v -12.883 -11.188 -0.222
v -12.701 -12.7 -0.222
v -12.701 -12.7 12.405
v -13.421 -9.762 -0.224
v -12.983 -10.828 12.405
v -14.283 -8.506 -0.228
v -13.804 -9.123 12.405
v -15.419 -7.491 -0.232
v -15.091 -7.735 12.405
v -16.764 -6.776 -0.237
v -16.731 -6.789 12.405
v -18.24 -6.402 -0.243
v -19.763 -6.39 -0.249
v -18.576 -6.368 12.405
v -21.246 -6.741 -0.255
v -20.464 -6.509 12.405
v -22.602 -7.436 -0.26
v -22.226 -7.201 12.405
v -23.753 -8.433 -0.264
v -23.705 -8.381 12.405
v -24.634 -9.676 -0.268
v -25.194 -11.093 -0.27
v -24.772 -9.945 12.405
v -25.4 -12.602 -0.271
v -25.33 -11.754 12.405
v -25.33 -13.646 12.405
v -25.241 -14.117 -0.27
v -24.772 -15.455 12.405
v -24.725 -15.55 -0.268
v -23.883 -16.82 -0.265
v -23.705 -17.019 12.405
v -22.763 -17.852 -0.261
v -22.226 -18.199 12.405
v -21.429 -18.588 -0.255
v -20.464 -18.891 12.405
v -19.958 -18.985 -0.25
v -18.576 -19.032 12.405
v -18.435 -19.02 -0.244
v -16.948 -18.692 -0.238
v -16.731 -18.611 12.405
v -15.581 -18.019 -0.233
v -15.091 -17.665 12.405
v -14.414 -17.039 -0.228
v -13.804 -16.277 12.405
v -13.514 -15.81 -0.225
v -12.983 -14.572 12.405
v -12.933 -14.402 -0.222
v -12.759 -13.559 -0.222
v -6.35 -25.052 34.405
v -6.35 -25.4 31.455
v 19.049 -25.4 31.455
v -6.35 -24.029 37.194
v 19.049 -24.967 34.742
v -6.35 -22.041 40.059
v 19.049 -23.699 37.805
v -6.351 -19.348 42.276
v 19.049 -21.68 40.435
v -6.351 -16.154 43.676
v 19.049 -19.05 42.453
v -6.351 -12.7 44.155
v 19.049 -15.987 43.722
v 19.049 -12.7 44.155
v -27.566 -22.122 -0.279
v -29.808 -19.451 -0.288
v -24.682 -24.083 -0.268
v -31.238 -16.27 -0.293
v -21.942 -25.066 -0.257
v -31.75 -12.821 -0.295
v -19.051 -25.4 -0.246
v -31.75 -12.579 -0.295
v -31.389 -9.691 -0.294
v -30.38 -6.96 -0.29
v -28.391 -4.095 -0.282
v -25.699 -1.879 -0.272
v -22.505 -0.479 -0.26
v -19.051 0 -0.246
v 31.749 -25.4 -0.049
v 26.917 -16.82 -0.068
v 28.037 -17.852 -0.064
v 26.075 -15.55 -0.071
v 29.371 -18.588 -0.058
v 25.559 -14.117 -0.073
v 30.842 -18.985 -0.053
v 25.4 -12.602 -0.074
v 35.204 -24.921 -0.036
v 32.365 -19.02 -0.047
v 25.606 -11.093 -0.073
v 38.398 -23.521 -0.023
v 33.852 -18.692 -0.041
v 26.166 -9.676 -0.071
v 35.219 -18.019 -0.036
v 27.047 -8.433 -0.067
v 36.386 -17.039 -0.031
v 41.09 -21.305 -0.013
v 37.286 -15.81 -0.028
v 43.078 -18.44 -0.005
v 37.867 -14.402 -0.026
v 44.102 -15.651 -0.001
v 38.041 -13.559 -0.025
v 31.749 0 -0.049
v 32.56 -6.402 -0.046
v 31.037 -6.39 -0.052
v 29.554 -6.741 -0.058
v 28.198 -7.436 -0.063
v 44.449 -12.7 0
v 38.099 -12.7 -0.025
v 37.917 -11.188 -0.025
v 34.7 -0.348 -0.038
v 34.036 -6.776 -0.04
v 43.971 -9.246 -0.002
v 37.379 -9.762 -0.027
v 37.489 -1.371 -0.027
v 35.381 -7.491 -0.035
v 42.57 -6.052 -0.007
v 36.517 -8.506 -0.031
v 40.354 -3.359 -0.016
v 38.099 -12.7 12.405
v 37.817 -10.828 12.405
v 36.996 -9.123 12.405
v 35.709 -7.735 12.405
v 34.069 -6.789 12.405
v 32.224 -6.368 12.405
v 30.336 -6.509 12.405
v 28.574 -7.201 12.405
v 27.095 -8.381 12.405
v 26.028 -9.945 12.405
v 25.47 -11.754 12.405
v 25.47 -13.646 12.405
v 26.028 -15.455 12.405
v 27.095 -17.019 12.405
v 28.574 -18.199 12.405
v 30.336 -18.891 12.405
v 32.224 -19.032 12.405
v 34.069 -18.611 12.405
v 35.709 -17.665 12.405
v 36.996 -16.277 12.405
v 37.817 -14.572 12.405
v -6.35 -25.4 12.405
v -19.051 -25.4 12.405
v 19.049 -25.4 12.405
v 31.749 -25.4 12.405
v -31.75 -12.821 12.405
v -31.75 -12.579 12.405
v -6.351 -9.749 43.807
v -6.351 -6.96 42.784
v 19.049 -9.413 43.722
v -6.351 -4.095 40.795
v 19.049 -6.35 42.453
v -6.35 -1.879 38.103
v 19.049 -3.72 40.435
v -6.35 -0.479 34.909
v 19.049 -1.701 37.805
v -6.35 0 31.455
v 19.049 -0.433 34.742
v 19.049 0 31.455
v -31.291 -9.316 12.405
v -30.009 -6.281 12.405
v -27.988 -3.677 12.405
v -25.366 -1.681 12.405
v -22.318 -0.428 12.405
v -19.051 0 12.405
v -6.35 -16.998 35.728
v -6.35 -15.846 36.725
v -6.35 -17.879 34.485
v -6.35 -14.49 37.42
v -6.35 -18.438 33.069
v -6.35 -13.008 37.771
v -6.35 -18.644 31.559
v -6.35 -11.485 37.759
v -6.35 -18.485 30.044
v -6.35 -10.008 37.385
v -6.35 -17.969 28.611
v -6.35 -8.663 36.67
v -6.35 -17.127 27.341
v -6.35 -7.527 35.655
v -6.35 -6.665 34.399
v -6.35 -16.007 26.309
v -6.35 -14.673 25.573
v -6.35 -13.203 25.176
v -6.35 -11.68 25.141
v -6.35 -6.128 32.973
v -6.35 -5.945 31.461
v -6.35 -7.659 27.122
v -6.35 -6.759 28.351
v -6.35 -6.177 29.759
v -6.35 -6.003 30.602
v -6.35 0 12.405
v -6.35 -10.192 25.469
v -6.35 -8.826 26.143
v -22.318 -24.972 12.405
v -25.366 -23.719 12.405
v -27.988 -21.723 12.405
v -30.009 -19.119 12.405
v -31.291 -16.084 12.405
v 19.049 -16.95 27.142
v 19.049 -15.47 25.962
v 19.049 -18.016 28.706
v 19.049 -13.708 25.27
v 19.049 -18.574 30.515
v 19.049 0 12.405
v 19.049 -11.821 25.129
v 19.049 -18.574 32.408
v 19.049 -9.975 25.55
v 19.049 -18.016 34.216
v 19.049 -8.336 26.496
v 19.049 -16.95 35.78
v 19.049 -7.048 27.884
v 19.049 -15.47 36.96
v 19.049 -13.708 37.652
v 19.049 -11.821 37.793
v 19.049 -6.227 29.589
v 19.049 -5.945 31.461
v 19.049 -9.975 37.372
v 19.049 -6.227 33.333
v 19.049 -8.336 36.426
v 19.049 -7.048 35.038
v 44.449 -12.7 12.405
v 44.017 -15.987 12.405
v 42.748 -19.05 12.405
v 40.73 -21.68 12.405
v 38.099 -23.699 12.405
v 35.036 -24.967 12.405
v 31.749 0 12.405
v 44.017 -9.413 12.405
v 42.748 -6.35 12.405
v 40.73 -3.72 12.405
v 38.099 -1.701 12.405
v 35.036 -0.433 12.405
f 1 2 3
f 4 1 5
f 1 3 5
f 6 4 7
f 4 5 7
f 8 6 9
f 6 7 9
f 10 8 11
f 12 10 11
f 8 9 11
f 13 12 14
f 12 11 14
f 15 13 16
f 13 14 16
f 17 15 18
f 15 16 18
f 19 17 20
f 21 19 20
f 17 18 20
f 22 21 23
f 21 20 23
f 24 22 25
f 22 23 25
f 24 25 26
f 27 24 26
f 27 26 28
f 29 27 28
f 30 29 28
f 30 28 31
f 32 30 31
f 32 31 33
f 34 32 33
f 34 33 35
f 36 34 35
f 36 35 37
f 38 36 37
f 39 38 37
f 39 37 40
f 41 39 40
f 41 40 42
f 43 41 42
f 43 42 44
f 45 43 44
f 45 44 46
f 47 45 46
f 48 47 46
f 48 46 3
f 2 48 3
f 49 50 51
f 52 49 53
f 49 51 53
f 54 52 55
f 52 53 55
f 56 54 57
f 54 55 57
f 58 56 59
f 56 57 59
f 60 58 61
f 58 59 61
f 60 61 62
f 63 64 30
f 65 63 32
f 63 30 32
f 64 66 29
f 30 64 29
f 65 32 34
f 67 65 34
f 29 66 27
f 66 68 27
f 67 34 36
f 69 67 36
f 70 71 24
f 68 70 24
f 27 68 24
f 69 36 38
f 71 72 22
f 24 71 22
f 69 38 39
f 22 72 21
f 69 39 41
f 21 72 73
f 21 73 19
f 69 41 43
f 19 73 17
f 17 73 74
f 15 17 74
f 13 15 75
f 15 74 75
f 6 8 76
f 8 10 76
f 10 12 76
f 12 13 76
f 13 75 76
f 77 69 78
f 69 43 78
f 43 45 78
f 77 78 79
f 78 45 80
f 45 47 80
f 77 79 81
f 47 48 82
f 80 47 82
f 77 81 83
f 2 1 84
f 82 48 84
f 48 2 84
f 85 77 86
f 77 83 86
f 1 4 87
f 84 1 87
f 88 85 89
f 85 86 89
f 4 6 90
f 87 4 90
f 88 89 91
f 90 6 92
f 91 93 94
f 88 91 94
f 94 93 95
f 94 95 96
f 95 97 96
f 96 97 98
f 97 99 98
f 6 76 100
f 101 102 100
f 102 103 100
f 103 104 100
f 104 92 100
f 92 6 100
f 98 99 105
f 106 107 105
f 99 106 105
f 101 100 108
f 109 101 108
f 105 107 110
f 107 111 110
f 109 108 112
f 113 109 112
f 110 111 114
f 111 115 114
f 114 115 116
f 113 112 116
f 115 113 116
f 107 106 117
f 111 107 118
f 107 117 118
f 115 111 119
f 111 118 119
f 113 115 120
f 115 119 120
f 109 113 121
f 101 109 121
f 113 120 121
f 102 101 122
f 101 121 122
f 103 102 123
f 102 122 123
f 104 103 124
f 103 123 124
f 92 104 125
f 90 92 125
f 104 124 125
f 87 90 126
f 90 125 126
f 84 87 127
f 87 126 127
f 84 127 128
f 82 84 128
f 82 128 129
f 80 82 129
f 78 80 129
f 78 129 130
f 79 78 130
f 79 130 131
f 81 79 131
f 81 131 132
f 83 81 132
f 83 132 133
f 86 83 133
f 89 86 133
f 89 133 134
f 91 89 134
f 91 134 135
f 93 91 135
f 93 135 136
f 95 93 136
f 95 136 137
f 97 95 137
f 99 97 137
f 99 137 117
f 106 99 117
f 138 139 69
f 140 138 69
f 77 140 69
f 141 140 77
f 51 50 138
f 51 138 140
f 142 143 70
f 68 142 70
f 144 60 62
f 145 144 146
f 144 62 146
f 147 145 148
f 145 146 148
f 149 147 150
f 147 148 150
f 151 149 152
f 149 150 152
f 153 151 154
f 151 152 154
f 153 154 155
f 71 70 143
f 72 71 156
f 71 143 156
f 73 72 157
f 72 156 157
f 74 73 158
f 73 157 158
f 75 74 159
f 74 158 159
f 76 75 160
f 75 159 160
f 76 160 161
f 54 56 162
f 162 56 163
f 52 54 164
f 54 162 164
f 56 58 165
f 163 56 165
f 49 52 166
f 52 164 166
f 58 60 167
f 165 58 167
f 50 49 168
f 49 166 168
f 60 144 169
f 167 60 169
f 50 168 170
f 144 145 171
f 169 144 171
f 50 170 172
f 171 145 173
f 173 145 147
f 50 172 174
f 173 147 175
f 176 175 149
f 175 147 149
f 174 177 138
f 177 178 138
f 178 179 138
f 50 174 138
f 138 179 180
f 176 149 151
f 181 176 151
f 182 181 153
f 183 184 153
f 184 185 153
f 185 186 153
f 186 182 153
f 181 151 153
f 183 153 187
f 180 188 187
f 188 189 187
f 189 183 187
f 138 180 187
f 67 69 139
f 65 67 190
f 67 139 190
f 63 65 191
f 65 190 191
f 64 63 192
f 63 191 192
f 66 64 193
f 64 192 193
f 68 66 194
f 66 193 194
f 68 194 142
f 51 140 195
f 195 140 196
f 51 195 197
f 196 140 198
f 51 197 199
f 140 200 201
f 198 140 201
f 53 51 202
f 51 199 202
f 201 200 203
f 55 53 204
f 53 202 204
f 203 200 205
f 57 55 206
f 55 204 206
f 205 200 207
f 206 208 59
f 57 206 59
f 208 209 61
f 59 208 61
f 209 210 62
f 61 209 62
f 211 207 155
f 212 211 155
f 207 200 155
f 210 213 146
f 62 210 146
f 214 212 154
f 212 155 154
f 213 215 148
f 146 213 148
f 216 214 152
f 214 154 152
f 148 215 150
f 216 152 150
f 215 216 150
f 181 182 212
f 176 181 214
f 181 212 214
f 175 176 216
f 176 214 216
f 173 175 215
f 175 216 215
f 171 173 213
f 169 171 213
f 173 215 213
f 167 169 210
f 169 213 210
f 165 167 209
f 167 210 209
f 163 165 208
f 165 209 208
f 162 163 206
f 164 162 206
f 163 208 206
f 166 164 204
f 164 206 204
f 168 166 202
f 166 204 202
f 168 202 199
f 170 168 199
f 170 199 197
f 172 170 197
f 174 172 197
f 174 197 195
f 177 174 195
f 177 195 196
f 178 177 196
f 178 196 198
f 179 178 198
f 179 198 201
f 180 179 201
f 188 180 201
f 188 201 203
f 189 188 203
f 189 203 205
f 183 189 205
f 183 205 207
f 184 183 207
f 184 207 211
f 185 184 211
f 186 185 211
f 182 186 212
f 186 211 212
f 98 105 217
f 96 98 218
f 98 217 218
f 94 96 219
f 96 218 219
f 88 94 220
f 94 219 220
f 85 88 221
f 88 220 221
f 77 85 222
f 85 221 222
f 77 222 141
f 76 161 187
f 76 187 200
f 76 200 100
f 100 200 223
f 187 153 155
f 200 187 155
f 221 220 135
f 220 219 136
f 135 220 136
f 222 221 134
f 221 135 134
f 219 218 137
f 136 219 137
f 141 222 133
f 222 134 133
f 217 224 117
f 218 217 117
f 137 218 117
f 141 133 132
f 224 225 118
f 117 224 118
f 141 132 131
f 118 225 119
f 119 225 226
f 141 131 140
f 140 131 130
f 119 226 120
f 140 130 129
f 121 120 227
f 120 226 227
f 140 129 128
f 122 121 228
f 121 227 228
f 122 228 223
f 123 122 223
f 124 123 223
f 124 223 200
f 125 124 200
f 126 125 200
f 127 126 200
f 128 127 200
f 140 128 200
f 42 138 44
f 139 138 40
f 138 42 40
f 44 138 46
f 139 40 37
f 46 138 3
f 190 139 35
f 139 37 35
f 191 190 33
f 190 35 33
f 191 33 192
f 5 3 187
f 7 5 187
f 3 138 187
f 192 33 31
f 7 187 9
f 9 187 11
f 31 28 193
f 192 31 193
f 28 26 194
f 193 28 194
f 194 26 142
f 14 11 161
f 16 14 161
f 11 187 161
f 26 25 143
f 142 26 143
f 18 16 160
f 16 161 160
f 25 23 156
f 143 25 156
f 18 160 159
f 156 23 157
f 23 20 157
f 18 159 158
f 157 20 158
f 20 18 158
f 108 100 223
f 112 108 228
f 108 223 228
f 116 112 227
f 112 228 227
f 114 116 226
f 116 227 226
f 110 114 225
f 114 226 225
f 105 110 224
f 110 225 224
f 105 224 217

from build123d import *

# Parameters (mm, degrees)
F1_DEPTH = 25.4
F2_R     = 6.35
F3_DEPTH = 25.4
F4_R     = 6.35
F5_DEPTH = 25.4
F6_R     = 6.35
F7_DEPTH = 25.4


with BuildPart() as f1:
    # F0 (on Front) → F1 (new body)
    with BuildSketch(Plane.XZ):
        Polygon((-31.75, 12.404651), (-31.75, -0.295349), (44.449428, -2e-06), (44.449428, 12.404651), (19.049428, 12.404651), (19.049428, 44.154651), (-6.350572, 44.154651), (-6.35, 12.404651), align=None)
    extrude(amount=F1_DEPTH)

    # F2 (on face) → F3 (cut)
    with BuildSketch(Plane.XY.offset(12.404651)):
        with Locations((-19.050572, -12.7)):
            Circle(F2_R)
        with BuildLine():
            ThreePointArc((-31.75, -12.579426), (-27.988098, -3.677215), (-19.050572, 0))
            Line((-19.050572, 0), (-31.75, 0))
            Line((-31.75, 0), (-31.75, -12.579426))
        make_face()
        with BuildLine():
            ThreePointArc((-19.050572, -25.4), (-27.988098, -21.722785), (-31.75, -12.820574))
            Line((-31.75, -12.820574), (-31.75, -25.4))
            Line((-31.75, -25.4), (-19.050572, -25.4))
        make_face()
    extrude(amount=-F3_DEPTH, mode=Mode.SUBTRACT)

    # F4 (on face) → F5 (cut)
    with BuildSketch(Plane.XY.offset(12.404651)):
        with Locations((31.749428, -12.7)):
            Circle(F4_R)
        with BuildLine():
            ThreePointArc((31.749428, 0), (40.729684, -3.719744), (44.449428, -12.7))
            Line((44.449428, -12.7), (44.449428, 0))
            Line((44.449428, 0), (31.749428, 0))
        make_face()
        with BuildLine():
            ThreePointArc((44.449428, -12.7), (40.729684, -21.680256), (31.749428, -25.4))
            Line((31.749428, -25.4), (44.449428, -25.4))
            Line((44.449428, -25.4), (44.449428, -12.7))
        make_face()
    extrude(amount=-F5_DEPTH, mode=Mode.SUBTRACT)

    # F6 (on face) → F7 (cut)
    with BuildSketch(Plane.YZ.offset(19.049428)):
        with Locations((-12.295053, 31.461109)):
            Circle(F6_R)
        with BuildLine():
            ThreePointArc((-12.7, 44.154651), (-3.719744, 40.434907), (0, 31.454651))
            Line((0, 31.454651), (0, 44.154651))
            Line((0, 44.154651), (-12.7, 44.154651))
        make_face()
        with BuildLine():
            ThreePointArc((-25.4, 31.454651), (-21.680256, 40.434907), (-12.7, 44.154651))
            Line((-12.7, 44.154651), (-25.4, 44.154651))
            Line((-25.4, 44.154651), (-25.4, 31.454651))
        make_face()
    extrude(amount=-F7_DEPTH, mode=Mode.SUBTRACT)


solid = f1.part
